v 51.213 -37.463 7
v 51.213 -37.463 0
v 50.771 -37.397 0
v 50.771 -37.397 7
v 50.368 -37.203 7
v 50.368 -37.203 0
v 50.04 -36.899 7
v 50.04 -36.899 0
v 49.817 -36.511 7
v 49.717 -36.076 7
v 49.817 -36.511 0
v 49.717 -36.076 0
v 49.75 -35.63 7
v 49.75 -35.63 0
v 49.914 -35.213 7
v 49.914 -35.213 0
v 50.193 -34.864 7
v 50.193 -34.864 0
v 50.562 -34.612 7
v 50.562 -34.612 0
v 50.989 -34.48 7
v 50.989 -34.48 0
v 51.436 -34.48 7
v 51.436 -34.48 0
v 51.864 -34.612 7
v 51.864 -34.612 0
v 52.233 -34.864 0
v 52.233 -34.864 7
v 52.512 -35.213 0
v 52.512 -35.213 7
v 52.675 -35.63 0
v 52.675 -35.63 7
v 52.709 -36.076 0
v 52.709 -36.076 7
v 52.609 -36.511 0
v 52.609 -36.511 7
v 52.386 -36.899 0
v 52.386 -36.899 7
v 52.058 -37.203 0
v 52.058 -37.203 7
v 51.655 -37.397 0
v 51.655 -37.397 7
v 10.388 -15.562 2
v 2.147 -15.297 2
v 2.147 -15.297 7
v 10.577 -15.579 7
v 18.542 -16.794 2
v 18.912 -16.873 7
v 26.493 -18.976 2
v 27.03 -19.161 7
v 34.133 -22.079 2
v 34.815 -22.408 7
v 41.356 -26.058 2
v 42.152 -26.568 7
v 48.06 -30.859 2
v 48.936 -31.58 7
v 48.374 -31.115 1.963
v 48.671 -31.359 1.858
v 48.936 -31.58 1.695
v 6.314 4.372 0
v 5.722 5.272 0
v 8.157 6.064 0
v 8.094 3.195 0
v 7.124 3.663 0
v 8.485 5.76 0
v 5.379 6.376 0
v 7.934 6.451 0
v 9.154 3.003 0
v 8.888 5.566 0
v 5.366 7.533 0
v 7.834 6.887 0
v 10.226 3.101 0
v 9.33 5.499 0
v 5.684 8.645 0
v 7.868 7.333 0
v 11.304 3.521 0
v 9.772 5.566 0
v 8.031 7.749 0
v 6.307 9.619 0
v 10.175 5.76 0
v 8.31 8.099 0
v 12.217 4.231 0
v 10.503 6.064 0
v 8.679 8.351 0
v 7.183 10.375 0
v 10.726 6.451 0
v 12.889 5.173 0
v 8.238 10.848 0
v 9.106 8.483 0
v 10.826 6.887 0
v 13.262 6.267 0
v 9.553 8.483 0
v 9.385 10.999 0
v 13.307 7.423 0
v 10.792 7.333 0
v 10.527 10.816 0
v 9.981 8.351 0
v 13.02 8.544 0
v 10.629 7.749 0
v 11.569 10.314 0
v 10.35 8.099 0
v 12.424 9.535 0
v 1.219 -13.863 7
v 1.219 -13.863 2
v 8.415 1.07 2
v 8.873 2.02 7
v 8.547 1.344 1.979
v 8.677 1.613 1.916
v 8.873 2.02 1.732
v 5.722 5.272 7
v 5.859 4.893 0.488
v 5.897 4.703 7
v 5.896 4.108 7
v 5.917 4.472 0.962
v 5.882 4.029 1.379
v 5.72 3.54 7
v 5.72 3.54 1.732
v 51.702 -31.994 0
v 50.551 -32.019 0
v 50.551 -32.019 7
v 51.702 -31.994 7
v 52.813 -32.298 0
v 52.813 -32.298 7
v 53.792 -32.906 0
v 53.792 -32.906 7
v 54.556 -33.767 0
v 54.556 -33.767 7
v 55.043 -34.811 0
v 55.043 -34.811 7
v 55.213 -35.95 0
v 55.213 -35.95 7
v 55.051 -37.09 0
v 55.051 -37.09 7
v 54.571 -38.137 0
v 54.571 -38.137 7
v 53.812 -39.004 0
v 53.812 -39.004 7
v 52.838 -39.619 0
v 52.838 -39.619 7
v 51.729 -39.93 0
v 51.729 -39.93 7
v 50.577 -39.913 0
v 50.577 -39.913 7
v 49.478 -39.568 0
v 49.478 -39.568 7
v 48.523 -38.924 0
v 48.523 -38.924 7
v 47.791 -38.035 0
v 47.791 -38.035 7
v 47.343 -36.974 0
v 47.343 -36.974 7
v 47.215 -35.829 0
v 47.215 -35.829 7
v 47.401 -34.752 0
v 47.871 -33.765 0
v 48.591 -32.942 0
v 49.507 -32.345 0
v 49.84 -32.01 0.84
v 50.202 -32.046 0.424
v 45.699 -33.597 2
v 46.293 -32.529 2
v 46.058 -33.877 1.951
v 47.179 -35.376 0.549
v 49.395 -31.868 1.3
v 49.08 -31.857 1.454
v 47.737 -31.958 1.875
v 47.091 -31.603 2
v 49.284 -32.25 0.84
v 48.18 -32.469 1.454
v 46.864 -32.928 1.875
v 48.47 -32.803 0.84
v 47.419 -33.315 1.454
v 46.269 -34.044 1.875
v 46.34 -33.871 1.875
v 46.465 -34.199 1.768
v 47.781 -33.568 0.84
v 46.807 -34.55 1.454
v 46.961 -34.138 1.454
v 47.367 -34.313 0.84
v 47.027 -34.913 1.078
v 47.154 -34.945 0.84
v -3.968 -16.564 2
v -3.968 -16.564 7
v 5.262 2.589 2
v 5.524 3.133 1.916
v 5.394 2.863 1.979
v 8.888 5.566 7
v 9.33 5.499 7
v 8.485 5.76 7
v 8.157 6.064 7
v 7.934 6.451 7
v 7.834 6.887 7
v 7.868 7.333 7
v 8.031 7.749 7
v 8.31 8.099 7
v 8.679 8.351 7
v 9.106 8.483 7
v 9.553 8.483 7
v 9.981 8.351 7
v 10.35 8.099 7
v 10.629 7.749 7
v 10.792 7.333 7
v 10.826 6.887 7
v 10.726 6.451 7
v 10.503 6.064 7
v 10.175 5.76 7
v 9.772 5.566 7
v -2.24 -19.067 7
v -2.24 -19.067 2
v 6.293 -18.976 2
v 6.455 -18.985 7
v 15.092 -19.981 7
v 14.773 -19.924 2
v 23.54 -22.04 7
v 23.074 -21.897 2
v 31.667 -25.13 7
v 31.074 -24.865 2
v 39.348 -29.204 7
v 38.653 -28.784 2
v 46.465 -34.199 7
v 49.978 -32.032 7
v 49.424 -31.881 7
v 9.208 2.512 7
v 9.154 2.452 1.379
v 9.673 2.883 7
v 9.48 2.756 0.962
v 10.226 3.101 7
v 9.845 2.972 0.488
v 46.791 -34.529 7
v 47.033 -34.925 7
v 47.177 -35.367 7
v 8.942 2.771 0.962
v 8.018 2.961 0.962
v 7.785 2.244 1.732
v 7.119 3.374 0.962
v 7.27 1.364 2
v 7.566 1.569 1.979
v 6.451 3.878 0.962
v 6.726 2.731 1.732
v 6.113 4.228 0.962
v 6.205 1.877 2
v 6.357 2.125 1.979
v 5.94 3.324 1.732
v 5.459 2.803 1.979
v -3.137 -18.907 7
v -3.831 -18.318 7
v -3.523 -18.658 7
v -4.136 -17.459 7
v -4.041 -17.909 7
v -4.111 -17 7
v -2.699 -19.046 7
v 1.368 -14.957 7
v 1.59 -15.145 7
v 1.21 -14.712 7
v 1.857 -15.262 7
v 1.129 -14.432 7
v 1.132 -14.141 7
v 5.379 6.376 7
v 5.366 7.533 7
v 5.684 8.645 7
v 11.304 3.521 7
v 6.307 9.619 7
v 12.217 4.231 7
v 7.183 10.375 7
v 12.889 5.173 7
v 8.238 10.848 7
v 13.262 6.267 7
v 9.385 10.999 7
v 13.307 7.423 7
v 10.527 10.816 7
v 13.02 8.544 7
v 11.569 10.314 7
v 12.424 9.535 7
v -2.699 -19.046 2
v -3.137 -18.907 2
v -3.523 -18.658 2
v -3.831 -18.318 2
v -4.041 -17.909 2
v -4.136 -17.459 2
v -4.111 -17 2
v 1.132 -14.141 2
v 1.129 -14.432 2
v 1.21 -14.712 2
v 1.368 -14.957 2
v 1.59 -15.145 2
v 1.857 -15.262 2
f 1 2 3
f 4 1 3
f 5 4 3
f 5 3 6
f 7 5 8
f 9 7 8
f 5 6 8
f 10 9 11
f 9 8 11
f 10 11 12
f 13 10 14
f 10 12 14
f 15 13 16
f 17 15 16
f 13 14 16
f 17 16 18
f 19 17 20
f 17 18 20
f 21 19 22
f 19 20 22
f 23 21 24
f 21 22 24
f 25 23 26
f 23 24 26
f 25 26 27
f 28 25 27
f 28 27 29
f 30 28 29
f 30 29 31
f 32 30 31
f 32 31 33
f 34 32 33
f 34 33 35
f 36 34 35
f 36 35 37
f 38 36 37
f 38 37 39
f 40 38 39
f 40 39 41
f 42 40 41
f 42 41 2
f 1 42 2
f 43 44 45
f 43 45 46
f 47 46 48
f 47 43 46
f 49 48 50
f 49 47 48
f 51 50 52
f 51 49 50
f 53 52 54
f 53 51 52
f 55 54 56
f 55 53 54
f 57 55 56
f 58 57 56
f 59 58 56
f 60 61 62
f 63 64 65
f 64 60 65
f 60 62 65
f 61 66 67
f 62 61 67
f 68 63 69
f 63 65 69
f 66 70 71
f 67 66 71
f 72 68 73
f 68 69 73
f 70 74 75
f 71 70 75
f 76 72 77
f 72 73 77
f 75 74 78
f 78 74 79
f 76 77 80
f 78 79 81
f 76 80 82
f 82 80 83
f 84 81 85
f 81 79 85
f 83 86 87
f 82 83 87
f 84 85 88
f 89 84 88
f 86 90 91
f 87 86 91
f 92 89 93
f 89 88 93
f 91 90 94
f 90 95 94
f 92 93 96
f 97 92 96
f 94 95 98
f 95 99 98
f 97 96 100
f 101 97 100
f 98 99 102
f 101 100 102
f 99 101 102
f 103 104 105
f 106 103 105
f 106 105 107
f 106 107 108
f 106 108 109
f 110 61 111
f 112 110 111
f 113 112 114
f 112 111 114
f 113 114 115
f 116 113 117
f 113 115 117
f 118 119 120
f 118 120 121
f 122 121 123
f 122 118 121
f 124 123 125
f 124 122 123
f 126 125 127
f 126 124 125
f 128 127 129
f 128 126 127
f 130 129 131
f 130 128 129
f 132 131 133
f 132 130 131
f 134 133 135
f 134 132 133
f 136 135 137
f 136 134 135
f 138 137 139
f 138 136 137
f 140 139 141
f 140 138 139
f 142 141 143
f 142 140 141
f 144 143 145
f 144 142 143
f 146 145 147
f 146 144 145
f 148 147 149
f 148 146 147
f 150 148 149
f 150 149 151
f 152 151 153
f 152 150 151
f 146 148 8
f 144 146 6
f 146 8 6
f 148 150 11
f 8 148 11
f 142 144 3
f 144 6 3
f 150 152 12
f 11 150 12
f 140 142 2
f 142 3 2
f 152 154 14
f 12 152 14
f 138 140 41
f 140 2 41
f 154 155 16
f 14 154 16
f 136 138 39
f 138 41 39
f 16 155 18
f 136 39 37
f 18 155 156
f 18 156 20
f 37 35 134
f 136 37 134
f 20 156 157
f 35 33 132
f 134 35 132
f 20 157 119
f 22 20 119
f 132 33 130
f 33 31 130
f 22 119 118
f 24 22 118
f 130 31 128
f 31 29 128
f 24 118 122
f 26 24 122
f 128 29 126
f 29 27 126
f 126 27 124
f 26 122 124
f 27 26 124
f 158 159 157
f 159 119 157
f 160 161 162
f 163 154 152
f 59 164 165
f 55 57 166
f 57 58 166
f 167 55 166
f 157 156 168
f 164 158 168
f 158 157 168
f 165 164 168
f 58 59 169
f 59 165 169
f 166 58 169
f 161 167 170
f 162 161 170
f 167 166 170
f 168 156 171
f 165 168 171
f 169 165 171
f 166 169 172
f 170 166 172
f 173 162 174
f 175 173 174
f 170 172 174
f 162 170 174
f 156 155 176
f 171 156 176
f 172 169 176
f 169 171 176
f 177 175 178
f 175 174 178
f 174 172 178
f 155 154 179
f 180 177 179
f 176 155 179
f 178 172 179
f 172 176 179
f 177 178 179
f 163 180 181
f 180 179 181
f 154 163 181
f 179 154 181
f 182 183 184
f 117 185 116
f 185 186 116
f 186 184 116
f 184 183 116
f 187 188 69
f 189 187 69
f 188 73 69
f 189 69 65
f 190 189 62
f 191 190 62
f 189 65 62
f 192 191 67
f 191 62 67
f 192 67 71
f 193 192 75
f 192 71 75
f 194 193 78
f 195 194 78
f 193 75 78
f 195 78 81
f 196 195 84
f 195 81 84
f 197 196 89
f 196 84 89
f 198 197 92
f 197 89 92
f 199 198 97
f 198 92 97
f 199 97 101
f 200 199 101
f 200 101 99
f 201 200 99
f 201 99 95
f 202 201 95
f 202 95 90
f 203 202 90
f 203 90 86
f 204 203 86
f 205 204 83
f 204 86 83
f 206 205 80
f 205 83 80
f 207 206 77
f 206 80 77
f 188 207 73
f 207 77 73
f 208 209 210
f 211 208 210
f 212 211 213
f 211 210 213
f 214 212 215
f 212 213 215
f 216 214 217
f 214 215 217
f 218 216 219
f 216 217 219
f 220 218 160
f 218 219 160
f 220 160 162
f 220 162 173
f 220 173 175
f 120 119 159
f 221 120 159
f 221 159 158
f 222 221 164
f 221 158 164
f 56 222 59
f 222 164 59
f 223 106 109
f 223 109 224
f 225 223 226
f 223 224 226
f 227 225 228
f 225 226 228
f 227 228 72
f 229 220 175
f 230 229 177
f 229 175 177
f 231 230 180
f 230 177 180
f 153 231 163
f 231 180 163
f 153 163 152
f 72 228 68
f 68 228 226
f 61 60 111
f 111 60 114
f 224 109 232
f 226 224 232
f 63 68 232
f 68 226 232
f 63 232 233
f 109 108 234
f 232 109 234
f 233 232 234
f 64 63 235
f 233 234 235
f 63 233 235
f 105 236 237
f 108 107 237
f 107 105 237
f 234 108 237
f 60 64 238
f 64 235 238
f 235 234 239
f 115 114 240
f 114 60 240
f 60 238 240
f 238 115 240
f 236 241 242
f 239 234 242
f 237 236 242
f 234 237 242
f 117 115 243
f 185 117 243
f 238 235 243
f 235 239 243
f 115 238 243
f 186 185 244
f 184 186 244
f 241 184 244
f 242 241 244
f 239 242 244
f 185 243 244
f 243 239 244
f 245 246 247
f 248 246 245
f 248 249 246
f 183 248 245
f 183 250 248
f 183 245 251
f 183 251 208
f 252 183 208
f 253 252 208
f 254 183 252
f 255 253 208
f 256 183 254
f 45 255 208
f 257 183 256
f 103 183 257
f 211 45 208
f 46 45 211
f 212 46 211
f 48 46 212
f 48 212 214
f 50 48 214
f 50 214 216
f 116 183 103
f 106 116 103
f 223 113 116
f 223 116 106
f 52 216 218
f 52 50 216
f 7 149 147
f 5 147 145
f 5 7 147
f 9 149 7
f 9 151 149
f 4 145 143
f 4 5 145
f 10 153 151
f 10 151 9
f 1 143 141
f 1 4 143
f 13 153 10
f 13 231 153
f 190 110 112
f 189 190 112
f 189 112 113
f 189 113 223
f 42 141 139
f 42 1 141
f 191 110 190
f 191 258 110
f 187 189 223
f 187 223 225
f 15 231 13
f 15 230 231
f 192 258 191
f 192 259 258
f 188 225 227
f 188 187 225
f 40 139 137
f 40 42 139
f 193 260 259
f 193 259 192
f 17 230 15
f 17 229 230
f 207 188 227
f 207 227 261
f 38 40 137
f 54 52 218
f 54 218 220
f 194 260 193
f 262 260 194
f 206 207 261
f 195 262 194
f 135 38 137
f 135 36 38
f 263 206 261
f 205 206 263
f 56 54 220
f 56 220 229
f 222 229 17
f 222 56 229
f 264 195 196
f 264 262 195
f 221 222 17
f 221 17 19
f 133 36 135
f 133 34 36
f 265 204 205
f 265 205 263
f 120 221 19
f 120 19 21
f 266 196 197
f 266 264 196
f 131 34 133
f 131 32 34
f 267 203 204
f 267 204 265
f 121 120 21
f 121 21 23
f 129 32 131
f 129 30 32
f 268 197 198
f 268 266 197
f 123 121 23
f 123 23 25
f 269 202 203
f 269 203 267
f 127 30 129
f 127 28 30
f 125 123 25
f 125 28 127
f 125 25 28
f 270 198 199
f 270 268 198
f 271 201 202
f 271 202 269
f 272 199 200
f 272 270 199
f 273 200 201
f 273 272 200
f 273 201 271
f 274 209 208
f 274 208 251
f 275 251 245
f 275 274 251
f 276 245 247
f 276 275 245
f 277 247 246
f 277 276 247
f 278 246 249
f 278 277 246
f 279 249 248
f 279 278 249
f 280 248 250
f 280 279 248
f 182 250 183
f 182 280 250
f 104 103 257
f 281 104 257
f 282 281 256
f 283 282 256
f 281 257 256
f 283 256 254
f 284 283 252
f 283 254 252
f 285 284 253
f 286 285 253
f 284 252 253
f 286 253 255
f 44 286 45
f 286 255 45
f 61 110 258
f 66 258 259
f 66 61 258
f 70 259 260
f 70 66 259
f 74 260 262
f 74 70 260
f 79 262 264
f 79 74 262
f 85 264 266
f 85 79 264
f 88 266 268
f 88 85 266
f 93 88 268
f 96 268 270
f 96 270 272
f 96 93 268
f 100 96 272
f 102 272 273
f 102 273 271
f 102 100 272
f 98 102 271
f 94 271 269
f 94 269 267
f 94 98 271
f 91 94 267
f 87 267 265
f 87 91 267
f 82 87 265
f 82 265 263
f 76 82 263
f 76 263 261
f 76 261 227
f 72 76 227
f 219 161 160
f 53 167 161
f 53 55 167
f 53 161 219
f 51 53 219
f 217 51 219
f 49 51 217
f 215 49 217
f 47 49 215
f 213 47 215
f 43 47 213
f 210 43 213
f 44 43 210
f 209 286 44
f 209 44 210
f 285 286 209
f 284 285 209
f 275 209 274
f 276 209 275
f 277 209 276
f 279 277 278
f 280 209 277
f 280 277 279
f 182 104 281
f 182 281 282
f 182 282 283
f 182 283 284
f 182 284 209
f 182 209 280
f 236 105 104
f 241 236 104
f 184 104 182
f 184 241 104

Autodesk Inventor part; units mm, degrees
ref_plane "YZ Plane" through (0, 0, 0) normal (1, 0, 0) x (0, 1, 0)
ref_plane "XZ Plane" through (0, 0, 0) normal (0, 1, 0) x (-1, 0, 0)
ref_plane "XY Plane" through (0, 0, 0) normal (0, 0, 1) x (1, 0, 0)
sketch "Sketch1" plane through (0, 0, 0) normal (0, 0, 1) x (1, 0, 0)
  circle A0 centre (9.329895, 6.999479) radius 4
  line L0 (9.329895, 6.999479) -> (-2.391324, -17.323617)
  circle A1 centre (51.212876, -35.96348) radius 4
  line L1 (9.329895, 6.999479) -> (-2.391324, -17.323617) construction
  line L2 (7.753398, 7.759188) -> (-3.967821, -16.563909)
  line L3 (-0.814827, -18.083326) -> (10.906392, 6.239771)
  arc A2 (10.906392, 6.239771) -> (7.753398, 7.759188) centre (9.329895, 6.999479) ccw
  arc A3 (-3.967821, -16.563909) -> (-0.814827, -18.083326) centre (-2.391324, -17.323617) ccw
  arc A4 (-2.542999, -15.580203) -> (-2.239649, -19.067032) centre (-2.391324, -17.323617) ccw
  arc A5 (49.95979, -37.185067) -> (52.465962, -34.741893) centre (51.212876, -35.96348) ccw
  arc A6 (49.95979, -37.185067) -> (-2.239649, -19.067032) centre (2.770217, -88.887525) ccw
  arc A7 (52.465962, -34.741893) -> (-2.542999, -15.580203) centre (4.022714, -85.271604) ccw
  point P0 (0, 0)
  point P1 (3.469285, -5.162069)
  point P2 (47.351434, -34.919803)
  point P3 (49.725474, -32.250309)
  point P4 (0.497325, -15.360435)
  point P5 (9.34492, 2.999507)
  point P6 (6.191926, 4.518925)
  point P7 (-2.239649, -19.067032)
  dimension "d0" = 8
  dimension "d1" = 27
  dimension "d3" = 8
  dimension "d4" = 3.5
  dimension "d6" = 3.5
  dimension "d7" = 70
  dimension "d8" = 70
extrude "Extrusion1" add sketch "Sketch1" along normal blind 7
sketch "Sketch2" plane through (0, 0, 7) normal (0, 0, 1) x (1, 0, 0)
  line L0 (0.497325, -15.360435) -> (9.34492, 2.999507)
  arc A0 (9.34492, 2.999507) -> (6.191926, 4.518925) centre (9.329895, 6.999479) ccw
  line L1 (6.191926, 4.518925) -> (-3.967821, -16.563909)
  arc A1 (-3.967821, -16.563909) -> (-2.239649, -19.067032) centre (-2.391324, -17.323617) ccw
  arc A2 (47.351434, -34.919803) -> (-2.239649, -19.067032) centre (2.770217, -88.887525) ccw
  arc A3 (47.351434, -34.919803) -> (49.725474, -32.250309) centre (51.212876, -35.96348) ccw
  arc A4 (49.725474, -32.250309) -> (0.497325, -15.360435) centre (4.022714, -85.271604) ccw
  point P0 (0, 0)
hole "Hole1" at (51.212876, -35.96348, 7) at (9.329895, 6.999479, 7) direction (0, 0, -1) diameter 3 depth 8
sketch "Sketch3" plane through (0, 0, 0) normal (0, 0, -1) x (-1, 0, 0)
  circle A0 centre (-51.212876, -35.96348) radius 1.5
  circle A1 centre (-9.329895, 6.999479) radius 1.5
  line L0 (-0.497325, -15.360435) -> (-9.34492, 2.999507)
  arc A2 (-0.497325, -15.360435) -> (-49.725474, -32.250309) centre (-4.022714, -85.271604) ccw
  arc A3 (-49.725474, -32.250309) -> (-47.351434, -34.919803) centre (-51.212876, -35.96348) ccw
  arc A4 (2.239649, -19.067032) -> (-47.351434, -34.919803) centre (-2.770217, -88.887525) ccw
  arc A5 (2.239649, -19.067032) -> (3.967821, -16.563909) centre (2.391324, -17.323617) ccw
  line L1 (-6.191926, 4.518925) -> (3.967821, -16.563909)
  arc A6 (-6.191926, 4.518925) -> (-9.34492, 2.999507) centre (-9.329895, 6.999479) ccw
  circle A7 centre (-9.329895, 6.999479) radius 4
  circle A8 centre (-51.212876, -35.96348) radius 4
  point P0 (0, 0)
  point P1 (-49.725474, -32.250309)
  dimension "d18" = 8
  dimension "d19" = 8
extrude "Extrusion2" cut sketch "Sketch3" against normal blind 2 contours L0 A7 L1 A5 A4 A8 A2
fillet "Fillet1" radius 2 6 edges at (47.3514, -34.9198, 4.5) (48.2239, -33.3053, 2) (49.7255, -32.2503, 4.5) (9.3449, 2.9995, 4.5) (7.5934, 3.3961, 2) (6.1919, 4.5189, 4.5)
fillet "Fillet2" radius 1 1 edges at (0.4973, -15.3604, 4.5)
properties part number "leg_link_3"
